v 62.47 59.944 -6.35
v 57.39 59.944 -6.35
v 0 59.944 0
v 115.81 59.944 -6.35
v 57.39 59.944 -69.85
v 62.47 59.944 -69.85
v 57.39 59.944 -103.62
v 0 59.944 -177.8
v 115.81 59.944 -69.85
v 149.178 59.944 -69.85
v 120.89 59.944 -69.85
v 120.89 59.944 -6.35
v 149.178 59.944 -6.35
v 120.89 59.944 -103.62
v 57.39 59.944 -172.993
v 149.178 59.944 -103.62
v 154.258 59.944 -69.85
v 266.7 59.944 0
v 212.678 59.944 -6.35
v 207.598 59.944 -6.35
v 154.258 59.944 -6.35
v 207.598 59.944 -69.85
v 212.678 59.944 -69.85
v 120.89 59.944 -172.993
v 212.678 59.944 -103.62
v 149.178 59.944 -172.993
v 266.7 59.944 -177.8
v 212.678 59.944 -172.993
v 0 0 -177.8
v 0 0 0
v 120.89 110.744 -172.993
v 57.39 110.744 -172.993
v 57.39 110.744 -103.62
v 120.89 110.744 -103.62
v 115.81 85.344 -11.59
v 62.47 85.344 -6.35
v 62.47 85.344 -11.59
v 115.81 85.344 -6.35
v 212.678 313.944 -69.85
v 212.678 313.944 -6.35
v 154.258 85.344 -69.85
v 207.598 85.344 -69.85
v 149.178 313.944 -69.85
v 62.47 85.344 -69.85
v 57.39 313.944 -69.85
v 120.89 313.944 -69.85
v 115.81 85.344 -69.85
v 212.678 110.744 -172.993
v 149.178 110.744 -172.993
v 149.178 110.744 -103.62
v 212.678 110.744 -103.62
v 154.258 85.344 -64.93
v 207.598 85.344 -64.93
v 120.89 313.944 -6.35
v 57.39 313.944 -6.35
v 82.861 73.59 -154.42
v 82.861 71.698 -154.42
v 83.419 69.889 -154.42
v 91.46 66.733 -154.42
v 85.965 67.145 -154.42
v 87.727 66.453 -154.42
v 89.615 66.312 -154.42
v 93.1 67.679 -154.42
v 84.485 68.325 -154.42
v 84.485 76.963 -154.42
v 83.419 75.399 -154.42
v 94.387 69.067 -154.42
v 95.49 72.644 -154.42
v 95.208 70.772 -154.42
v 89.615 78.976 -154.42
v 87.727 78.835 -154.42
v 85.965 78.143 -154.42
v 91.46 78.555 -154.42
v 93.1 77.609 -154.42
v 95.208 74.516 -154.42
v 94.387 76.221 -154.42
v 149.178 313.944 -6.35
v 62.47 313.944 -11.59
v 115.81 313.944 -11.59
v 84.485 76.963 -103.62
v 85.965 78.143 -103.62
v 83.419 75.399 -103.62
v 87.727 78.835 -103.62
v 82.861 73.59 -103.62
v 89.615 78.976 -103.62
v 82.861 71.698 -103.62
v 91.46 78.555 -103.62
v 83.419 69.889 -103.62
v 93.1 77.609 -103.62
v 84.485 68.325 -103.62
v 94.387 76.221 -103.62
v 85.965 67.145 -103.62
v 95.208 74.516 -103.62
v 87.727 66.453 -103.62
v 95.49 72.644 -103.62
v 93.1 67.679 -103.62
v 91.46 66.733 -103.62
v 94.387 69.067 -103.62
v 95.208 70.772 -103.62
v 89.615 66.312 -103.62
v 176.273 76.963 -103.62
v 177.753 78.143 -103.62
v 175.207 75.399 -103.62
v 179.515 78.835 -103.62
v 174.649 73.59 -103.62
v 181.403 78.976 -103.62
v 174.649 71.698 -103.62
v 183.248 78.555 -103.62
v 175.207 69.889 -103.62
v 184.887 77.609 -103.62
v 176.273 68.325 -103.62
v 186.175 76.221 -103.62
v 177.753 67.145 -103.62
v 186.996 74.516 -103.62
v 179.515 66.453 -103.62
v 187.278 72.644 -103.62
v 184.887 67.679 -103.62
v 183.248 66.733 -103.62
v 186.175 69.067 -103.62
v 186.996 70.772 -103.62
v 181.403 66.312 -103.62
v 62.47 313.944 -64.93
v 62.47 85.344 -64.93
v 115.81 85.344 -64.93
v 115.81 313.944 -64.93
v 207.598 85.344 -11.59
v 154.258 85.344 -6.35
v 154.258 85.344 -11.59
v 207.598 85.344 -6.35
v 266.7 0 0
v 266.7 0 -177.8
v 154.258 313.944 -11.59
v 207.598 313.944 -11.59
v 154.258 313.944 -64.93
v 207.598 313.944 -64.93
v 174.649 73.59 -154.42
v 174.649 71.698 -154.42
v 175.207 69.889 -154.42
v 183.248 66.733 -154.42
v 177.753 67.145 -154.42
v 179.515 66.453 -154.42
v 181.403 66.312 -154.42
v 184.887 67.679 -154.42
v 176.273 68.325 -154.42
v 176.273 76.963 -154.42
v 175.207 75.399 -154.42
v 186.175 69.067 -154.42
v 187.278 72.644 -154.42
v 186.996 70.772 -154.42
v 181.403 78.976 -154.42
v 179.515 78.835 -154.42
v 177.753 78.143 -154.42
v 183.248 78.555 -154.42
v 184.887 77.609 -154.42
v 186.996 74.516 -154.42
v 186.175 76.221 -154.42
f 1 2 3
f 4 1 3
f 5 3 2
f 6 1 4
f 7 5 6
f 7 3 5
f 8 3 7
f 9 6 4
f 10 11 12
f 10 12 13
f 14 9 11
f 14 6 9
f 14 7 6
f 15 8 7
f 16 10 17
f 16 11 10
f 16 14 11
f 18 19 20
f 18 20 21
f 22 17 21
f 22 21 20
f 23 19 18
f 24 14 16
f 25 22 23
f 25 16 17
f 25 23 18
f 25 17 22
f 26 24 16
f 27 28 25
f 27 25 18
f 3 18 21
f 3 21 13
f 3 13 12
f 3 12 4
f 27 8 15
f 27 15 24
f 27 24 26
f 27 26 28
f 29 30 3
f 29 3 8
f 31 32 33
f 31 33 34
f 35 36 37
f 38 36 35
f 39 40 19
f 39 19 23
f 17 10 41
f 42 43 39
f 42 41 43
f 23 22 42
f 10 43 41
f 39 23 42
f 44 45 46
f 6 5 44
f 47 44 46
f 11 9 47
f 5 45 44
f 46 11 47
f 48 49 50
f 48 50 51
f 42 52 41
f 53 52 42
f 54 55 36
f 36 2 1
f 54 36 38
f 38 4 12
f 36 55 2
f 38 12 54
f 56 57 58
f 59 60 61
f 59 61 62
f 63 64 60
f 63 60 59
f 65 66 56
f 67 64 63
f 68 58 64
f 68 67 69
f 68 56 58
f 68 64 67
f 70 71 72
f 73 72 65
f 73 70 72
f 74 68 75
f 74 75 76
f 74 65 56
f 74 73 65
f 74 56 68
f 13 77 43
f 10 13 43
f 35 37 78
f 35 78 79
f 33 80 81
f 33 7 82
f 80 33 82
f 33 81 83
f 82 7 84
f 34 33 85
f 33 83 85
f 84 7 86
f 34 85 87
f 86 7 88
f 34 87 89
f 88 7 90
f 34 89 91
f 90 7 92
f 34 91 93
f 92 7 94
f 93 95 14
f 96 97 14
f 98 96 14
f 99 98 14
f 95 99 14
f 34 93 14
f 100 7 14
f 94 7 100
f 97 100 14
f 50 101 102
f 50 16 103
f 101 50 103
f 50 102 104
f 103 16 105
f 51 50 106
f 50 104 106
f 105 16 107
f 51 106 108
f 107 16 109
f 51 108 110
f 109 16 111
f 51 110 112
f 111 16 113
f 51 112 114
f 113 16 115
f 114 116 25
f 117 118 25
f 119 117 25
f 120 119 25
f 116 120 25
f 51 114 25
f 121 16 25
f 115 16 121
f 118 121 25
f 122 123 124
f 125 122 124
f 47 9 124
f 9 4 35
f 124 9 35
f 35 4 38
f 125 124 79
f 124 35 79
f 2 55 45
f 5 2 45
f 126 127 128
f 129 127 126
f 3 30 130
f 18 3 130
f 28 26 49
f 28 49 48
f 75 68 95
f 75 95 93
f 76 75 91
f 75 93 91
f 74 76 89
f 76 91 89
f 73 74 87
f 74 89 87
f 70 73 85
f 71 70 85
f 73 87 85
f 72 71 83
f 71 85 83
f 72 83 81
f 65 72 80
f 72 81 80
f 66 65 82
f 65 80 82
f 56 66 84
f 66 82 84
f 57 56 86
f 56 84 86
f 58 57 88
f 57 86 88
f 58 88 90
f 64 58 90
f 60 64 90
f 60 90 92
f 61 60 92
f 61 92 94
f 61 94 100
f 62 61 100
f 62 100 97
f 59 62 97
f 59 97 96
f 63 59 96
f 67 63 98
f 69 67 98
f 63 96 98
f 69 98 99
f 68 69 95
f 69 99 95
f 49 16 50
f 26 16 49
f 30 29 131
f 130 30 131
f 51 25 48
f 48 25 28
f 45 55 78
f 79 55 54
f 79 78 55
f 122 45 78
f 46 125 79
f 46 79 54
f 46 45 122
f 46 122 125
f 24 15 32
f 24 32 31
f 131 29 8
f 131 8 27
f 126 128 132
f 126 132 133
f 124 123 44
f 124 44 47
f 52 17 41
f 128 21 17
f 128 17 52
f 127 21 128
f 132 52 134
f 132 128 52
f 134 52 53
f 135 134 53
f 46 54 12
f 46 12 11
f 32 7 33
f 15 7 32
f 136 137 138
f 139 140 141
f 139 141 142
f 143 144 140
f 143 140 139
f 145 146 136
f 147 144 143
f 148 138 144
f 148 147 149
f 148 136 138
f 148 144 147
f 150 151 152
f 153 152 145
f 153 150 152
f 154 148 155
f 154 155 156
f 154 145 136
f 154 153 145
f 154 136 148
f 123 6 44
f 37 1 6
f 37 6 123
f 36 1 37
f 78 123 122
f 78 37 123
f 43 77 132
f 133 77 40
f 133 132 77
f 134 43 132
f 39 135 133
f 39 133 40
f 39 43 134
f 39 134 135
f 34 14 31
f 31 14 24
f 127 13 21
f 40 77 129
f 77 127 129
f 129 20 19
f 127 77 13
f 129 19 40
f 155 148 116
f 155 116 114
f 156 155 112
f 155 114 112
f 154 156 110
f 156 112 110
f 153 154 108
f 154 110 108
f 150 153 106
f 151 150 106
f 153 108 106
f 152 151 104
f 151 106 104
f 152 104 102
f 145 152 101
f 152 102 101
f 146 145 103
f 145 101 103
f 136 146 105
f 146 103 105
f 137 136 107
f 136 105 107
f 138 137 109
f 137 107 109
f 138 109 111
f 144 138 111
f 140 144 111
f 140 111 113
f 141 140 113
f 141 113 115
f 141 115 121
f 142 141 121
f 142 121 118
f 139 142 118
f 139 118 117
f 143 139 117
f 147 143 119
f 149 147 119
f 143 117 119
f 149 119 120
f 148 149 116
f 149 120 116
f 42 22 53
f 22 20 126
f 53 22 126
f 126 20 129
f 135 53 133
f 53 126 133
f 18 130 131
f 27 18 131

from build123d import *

# Parameters (mm, degrees)
SKETCH1_W           = 266.7
SKETCH1_H           = 177.8
BOSS_EXTRUDE1_DEPTH = 59.944
SKETCH2_W           = 63.5
SKETCH2_H           = 63.5
SKETCH2_W_2         = 53.34
SKETCH2_H_2         = 53.34
BOSS_EXTRUDE2_DEPTH = 254
SKETCH3_W           = 53.34
SKETCH3_H           = 25.4
CUT_EXTRUDE1_DEPTH  = 254
SKETCH4_W           = 63.5
SKETCH4_H           = 69.373154479
BOSS_EXTRUDE3_DEPTH = 50.8
SKETCH5_R           = 6.35
CUT_EXTRUDE2_DEPTH  = 50.8


with BuildPart() as part:
    # Sketch1 → Boss-Extrude1 (new body)
    with BuildSketch(Plane(origin=(0, 0, 0), x_dir=(1, 0, 0), z_dir=(0, 1, 0))):
        with Locations((133.35, 88.9)):
            Rectangle(SKETCH1_W, SKETCH1_H)
    extrude(amount=BOSS_EXTRUDE1_DEPTH)

    # Sketch2 → Boss-Extrude2 (add)
    with BuildSketch(Plane(origin=(0, 59.944, 0), x_dir=(1, 0, 0), z_dir=(0, 1, 0))):
        with Locations((180.927983049, 38.1)):
            Rectangle(SKETCH2_W, SKETCH2_H)
        with Locations((180.927983049, 38.260329554)):
            Rectangle(SKETCH2_W_2, SKETCH2_H_2, mode=Mode.SUBTRACT)
        with Locations((89.140378802, 38.1)):
            Rectangle(SKETCH2_W, SKETCH2_H)
        with Locations((89.140378802, 38.260329554)):
            Rectangle(SKETCH2_W_2, SKETCH2_H_2, mode=Mode.SUBTRACT)
    extrude(amount=BOSS_EXTRUDE2_DEPTH)

    # Sketch3 → Cut-Extrude1 (cut)
    with BuildSketch(Plane.XY.offset(-6.35)):
        with Locations((89.140378802, 72.644)):
            Rectangle(SKETCH3_W, SKETCH3_H)
        with Locations((180.927983049, 72.644)):
            Rectangle(SKETCH3_W, SKETCH3_H)
    extrude(amount=-CUT_EXTRUDE1_DEPTH, mode=Mode.SUBTRACT)

    # Sketch4 → Boss-Extrude3 (add)
    with BuildSketch(Plane(origin=(0, 59.944, 0), x_dir=(1, 0, 0), z_dir=(0, 1, 0))):
        with Locations((89.140378802, 138.306511279)):
            Rectangle(SKETCH4_W, SKETCH4_H)
        with Locations((180.927983049, 138.306511279)):
            Rectangle(SKETCH4_W, SKETCH4_H)
    extrude(amount=BOSS_EXTRUDE3_DEPTH)

    # Sketch5 → Cut-Extrude2 (cut)
    with BuildSketch(Plane.XY.offset(-103.619934039)):
        with Locations((180.927983049, 72.644)):
            Circle(SKETCH5_R)
        with Locations((89.140378802, 72.644)):
            Circle(SKETCH5_R)
    extrude(amount=-CUT_EXTRUDE2_DEPTH, mode=Mode.SUBTRACT)


solid = part.part
